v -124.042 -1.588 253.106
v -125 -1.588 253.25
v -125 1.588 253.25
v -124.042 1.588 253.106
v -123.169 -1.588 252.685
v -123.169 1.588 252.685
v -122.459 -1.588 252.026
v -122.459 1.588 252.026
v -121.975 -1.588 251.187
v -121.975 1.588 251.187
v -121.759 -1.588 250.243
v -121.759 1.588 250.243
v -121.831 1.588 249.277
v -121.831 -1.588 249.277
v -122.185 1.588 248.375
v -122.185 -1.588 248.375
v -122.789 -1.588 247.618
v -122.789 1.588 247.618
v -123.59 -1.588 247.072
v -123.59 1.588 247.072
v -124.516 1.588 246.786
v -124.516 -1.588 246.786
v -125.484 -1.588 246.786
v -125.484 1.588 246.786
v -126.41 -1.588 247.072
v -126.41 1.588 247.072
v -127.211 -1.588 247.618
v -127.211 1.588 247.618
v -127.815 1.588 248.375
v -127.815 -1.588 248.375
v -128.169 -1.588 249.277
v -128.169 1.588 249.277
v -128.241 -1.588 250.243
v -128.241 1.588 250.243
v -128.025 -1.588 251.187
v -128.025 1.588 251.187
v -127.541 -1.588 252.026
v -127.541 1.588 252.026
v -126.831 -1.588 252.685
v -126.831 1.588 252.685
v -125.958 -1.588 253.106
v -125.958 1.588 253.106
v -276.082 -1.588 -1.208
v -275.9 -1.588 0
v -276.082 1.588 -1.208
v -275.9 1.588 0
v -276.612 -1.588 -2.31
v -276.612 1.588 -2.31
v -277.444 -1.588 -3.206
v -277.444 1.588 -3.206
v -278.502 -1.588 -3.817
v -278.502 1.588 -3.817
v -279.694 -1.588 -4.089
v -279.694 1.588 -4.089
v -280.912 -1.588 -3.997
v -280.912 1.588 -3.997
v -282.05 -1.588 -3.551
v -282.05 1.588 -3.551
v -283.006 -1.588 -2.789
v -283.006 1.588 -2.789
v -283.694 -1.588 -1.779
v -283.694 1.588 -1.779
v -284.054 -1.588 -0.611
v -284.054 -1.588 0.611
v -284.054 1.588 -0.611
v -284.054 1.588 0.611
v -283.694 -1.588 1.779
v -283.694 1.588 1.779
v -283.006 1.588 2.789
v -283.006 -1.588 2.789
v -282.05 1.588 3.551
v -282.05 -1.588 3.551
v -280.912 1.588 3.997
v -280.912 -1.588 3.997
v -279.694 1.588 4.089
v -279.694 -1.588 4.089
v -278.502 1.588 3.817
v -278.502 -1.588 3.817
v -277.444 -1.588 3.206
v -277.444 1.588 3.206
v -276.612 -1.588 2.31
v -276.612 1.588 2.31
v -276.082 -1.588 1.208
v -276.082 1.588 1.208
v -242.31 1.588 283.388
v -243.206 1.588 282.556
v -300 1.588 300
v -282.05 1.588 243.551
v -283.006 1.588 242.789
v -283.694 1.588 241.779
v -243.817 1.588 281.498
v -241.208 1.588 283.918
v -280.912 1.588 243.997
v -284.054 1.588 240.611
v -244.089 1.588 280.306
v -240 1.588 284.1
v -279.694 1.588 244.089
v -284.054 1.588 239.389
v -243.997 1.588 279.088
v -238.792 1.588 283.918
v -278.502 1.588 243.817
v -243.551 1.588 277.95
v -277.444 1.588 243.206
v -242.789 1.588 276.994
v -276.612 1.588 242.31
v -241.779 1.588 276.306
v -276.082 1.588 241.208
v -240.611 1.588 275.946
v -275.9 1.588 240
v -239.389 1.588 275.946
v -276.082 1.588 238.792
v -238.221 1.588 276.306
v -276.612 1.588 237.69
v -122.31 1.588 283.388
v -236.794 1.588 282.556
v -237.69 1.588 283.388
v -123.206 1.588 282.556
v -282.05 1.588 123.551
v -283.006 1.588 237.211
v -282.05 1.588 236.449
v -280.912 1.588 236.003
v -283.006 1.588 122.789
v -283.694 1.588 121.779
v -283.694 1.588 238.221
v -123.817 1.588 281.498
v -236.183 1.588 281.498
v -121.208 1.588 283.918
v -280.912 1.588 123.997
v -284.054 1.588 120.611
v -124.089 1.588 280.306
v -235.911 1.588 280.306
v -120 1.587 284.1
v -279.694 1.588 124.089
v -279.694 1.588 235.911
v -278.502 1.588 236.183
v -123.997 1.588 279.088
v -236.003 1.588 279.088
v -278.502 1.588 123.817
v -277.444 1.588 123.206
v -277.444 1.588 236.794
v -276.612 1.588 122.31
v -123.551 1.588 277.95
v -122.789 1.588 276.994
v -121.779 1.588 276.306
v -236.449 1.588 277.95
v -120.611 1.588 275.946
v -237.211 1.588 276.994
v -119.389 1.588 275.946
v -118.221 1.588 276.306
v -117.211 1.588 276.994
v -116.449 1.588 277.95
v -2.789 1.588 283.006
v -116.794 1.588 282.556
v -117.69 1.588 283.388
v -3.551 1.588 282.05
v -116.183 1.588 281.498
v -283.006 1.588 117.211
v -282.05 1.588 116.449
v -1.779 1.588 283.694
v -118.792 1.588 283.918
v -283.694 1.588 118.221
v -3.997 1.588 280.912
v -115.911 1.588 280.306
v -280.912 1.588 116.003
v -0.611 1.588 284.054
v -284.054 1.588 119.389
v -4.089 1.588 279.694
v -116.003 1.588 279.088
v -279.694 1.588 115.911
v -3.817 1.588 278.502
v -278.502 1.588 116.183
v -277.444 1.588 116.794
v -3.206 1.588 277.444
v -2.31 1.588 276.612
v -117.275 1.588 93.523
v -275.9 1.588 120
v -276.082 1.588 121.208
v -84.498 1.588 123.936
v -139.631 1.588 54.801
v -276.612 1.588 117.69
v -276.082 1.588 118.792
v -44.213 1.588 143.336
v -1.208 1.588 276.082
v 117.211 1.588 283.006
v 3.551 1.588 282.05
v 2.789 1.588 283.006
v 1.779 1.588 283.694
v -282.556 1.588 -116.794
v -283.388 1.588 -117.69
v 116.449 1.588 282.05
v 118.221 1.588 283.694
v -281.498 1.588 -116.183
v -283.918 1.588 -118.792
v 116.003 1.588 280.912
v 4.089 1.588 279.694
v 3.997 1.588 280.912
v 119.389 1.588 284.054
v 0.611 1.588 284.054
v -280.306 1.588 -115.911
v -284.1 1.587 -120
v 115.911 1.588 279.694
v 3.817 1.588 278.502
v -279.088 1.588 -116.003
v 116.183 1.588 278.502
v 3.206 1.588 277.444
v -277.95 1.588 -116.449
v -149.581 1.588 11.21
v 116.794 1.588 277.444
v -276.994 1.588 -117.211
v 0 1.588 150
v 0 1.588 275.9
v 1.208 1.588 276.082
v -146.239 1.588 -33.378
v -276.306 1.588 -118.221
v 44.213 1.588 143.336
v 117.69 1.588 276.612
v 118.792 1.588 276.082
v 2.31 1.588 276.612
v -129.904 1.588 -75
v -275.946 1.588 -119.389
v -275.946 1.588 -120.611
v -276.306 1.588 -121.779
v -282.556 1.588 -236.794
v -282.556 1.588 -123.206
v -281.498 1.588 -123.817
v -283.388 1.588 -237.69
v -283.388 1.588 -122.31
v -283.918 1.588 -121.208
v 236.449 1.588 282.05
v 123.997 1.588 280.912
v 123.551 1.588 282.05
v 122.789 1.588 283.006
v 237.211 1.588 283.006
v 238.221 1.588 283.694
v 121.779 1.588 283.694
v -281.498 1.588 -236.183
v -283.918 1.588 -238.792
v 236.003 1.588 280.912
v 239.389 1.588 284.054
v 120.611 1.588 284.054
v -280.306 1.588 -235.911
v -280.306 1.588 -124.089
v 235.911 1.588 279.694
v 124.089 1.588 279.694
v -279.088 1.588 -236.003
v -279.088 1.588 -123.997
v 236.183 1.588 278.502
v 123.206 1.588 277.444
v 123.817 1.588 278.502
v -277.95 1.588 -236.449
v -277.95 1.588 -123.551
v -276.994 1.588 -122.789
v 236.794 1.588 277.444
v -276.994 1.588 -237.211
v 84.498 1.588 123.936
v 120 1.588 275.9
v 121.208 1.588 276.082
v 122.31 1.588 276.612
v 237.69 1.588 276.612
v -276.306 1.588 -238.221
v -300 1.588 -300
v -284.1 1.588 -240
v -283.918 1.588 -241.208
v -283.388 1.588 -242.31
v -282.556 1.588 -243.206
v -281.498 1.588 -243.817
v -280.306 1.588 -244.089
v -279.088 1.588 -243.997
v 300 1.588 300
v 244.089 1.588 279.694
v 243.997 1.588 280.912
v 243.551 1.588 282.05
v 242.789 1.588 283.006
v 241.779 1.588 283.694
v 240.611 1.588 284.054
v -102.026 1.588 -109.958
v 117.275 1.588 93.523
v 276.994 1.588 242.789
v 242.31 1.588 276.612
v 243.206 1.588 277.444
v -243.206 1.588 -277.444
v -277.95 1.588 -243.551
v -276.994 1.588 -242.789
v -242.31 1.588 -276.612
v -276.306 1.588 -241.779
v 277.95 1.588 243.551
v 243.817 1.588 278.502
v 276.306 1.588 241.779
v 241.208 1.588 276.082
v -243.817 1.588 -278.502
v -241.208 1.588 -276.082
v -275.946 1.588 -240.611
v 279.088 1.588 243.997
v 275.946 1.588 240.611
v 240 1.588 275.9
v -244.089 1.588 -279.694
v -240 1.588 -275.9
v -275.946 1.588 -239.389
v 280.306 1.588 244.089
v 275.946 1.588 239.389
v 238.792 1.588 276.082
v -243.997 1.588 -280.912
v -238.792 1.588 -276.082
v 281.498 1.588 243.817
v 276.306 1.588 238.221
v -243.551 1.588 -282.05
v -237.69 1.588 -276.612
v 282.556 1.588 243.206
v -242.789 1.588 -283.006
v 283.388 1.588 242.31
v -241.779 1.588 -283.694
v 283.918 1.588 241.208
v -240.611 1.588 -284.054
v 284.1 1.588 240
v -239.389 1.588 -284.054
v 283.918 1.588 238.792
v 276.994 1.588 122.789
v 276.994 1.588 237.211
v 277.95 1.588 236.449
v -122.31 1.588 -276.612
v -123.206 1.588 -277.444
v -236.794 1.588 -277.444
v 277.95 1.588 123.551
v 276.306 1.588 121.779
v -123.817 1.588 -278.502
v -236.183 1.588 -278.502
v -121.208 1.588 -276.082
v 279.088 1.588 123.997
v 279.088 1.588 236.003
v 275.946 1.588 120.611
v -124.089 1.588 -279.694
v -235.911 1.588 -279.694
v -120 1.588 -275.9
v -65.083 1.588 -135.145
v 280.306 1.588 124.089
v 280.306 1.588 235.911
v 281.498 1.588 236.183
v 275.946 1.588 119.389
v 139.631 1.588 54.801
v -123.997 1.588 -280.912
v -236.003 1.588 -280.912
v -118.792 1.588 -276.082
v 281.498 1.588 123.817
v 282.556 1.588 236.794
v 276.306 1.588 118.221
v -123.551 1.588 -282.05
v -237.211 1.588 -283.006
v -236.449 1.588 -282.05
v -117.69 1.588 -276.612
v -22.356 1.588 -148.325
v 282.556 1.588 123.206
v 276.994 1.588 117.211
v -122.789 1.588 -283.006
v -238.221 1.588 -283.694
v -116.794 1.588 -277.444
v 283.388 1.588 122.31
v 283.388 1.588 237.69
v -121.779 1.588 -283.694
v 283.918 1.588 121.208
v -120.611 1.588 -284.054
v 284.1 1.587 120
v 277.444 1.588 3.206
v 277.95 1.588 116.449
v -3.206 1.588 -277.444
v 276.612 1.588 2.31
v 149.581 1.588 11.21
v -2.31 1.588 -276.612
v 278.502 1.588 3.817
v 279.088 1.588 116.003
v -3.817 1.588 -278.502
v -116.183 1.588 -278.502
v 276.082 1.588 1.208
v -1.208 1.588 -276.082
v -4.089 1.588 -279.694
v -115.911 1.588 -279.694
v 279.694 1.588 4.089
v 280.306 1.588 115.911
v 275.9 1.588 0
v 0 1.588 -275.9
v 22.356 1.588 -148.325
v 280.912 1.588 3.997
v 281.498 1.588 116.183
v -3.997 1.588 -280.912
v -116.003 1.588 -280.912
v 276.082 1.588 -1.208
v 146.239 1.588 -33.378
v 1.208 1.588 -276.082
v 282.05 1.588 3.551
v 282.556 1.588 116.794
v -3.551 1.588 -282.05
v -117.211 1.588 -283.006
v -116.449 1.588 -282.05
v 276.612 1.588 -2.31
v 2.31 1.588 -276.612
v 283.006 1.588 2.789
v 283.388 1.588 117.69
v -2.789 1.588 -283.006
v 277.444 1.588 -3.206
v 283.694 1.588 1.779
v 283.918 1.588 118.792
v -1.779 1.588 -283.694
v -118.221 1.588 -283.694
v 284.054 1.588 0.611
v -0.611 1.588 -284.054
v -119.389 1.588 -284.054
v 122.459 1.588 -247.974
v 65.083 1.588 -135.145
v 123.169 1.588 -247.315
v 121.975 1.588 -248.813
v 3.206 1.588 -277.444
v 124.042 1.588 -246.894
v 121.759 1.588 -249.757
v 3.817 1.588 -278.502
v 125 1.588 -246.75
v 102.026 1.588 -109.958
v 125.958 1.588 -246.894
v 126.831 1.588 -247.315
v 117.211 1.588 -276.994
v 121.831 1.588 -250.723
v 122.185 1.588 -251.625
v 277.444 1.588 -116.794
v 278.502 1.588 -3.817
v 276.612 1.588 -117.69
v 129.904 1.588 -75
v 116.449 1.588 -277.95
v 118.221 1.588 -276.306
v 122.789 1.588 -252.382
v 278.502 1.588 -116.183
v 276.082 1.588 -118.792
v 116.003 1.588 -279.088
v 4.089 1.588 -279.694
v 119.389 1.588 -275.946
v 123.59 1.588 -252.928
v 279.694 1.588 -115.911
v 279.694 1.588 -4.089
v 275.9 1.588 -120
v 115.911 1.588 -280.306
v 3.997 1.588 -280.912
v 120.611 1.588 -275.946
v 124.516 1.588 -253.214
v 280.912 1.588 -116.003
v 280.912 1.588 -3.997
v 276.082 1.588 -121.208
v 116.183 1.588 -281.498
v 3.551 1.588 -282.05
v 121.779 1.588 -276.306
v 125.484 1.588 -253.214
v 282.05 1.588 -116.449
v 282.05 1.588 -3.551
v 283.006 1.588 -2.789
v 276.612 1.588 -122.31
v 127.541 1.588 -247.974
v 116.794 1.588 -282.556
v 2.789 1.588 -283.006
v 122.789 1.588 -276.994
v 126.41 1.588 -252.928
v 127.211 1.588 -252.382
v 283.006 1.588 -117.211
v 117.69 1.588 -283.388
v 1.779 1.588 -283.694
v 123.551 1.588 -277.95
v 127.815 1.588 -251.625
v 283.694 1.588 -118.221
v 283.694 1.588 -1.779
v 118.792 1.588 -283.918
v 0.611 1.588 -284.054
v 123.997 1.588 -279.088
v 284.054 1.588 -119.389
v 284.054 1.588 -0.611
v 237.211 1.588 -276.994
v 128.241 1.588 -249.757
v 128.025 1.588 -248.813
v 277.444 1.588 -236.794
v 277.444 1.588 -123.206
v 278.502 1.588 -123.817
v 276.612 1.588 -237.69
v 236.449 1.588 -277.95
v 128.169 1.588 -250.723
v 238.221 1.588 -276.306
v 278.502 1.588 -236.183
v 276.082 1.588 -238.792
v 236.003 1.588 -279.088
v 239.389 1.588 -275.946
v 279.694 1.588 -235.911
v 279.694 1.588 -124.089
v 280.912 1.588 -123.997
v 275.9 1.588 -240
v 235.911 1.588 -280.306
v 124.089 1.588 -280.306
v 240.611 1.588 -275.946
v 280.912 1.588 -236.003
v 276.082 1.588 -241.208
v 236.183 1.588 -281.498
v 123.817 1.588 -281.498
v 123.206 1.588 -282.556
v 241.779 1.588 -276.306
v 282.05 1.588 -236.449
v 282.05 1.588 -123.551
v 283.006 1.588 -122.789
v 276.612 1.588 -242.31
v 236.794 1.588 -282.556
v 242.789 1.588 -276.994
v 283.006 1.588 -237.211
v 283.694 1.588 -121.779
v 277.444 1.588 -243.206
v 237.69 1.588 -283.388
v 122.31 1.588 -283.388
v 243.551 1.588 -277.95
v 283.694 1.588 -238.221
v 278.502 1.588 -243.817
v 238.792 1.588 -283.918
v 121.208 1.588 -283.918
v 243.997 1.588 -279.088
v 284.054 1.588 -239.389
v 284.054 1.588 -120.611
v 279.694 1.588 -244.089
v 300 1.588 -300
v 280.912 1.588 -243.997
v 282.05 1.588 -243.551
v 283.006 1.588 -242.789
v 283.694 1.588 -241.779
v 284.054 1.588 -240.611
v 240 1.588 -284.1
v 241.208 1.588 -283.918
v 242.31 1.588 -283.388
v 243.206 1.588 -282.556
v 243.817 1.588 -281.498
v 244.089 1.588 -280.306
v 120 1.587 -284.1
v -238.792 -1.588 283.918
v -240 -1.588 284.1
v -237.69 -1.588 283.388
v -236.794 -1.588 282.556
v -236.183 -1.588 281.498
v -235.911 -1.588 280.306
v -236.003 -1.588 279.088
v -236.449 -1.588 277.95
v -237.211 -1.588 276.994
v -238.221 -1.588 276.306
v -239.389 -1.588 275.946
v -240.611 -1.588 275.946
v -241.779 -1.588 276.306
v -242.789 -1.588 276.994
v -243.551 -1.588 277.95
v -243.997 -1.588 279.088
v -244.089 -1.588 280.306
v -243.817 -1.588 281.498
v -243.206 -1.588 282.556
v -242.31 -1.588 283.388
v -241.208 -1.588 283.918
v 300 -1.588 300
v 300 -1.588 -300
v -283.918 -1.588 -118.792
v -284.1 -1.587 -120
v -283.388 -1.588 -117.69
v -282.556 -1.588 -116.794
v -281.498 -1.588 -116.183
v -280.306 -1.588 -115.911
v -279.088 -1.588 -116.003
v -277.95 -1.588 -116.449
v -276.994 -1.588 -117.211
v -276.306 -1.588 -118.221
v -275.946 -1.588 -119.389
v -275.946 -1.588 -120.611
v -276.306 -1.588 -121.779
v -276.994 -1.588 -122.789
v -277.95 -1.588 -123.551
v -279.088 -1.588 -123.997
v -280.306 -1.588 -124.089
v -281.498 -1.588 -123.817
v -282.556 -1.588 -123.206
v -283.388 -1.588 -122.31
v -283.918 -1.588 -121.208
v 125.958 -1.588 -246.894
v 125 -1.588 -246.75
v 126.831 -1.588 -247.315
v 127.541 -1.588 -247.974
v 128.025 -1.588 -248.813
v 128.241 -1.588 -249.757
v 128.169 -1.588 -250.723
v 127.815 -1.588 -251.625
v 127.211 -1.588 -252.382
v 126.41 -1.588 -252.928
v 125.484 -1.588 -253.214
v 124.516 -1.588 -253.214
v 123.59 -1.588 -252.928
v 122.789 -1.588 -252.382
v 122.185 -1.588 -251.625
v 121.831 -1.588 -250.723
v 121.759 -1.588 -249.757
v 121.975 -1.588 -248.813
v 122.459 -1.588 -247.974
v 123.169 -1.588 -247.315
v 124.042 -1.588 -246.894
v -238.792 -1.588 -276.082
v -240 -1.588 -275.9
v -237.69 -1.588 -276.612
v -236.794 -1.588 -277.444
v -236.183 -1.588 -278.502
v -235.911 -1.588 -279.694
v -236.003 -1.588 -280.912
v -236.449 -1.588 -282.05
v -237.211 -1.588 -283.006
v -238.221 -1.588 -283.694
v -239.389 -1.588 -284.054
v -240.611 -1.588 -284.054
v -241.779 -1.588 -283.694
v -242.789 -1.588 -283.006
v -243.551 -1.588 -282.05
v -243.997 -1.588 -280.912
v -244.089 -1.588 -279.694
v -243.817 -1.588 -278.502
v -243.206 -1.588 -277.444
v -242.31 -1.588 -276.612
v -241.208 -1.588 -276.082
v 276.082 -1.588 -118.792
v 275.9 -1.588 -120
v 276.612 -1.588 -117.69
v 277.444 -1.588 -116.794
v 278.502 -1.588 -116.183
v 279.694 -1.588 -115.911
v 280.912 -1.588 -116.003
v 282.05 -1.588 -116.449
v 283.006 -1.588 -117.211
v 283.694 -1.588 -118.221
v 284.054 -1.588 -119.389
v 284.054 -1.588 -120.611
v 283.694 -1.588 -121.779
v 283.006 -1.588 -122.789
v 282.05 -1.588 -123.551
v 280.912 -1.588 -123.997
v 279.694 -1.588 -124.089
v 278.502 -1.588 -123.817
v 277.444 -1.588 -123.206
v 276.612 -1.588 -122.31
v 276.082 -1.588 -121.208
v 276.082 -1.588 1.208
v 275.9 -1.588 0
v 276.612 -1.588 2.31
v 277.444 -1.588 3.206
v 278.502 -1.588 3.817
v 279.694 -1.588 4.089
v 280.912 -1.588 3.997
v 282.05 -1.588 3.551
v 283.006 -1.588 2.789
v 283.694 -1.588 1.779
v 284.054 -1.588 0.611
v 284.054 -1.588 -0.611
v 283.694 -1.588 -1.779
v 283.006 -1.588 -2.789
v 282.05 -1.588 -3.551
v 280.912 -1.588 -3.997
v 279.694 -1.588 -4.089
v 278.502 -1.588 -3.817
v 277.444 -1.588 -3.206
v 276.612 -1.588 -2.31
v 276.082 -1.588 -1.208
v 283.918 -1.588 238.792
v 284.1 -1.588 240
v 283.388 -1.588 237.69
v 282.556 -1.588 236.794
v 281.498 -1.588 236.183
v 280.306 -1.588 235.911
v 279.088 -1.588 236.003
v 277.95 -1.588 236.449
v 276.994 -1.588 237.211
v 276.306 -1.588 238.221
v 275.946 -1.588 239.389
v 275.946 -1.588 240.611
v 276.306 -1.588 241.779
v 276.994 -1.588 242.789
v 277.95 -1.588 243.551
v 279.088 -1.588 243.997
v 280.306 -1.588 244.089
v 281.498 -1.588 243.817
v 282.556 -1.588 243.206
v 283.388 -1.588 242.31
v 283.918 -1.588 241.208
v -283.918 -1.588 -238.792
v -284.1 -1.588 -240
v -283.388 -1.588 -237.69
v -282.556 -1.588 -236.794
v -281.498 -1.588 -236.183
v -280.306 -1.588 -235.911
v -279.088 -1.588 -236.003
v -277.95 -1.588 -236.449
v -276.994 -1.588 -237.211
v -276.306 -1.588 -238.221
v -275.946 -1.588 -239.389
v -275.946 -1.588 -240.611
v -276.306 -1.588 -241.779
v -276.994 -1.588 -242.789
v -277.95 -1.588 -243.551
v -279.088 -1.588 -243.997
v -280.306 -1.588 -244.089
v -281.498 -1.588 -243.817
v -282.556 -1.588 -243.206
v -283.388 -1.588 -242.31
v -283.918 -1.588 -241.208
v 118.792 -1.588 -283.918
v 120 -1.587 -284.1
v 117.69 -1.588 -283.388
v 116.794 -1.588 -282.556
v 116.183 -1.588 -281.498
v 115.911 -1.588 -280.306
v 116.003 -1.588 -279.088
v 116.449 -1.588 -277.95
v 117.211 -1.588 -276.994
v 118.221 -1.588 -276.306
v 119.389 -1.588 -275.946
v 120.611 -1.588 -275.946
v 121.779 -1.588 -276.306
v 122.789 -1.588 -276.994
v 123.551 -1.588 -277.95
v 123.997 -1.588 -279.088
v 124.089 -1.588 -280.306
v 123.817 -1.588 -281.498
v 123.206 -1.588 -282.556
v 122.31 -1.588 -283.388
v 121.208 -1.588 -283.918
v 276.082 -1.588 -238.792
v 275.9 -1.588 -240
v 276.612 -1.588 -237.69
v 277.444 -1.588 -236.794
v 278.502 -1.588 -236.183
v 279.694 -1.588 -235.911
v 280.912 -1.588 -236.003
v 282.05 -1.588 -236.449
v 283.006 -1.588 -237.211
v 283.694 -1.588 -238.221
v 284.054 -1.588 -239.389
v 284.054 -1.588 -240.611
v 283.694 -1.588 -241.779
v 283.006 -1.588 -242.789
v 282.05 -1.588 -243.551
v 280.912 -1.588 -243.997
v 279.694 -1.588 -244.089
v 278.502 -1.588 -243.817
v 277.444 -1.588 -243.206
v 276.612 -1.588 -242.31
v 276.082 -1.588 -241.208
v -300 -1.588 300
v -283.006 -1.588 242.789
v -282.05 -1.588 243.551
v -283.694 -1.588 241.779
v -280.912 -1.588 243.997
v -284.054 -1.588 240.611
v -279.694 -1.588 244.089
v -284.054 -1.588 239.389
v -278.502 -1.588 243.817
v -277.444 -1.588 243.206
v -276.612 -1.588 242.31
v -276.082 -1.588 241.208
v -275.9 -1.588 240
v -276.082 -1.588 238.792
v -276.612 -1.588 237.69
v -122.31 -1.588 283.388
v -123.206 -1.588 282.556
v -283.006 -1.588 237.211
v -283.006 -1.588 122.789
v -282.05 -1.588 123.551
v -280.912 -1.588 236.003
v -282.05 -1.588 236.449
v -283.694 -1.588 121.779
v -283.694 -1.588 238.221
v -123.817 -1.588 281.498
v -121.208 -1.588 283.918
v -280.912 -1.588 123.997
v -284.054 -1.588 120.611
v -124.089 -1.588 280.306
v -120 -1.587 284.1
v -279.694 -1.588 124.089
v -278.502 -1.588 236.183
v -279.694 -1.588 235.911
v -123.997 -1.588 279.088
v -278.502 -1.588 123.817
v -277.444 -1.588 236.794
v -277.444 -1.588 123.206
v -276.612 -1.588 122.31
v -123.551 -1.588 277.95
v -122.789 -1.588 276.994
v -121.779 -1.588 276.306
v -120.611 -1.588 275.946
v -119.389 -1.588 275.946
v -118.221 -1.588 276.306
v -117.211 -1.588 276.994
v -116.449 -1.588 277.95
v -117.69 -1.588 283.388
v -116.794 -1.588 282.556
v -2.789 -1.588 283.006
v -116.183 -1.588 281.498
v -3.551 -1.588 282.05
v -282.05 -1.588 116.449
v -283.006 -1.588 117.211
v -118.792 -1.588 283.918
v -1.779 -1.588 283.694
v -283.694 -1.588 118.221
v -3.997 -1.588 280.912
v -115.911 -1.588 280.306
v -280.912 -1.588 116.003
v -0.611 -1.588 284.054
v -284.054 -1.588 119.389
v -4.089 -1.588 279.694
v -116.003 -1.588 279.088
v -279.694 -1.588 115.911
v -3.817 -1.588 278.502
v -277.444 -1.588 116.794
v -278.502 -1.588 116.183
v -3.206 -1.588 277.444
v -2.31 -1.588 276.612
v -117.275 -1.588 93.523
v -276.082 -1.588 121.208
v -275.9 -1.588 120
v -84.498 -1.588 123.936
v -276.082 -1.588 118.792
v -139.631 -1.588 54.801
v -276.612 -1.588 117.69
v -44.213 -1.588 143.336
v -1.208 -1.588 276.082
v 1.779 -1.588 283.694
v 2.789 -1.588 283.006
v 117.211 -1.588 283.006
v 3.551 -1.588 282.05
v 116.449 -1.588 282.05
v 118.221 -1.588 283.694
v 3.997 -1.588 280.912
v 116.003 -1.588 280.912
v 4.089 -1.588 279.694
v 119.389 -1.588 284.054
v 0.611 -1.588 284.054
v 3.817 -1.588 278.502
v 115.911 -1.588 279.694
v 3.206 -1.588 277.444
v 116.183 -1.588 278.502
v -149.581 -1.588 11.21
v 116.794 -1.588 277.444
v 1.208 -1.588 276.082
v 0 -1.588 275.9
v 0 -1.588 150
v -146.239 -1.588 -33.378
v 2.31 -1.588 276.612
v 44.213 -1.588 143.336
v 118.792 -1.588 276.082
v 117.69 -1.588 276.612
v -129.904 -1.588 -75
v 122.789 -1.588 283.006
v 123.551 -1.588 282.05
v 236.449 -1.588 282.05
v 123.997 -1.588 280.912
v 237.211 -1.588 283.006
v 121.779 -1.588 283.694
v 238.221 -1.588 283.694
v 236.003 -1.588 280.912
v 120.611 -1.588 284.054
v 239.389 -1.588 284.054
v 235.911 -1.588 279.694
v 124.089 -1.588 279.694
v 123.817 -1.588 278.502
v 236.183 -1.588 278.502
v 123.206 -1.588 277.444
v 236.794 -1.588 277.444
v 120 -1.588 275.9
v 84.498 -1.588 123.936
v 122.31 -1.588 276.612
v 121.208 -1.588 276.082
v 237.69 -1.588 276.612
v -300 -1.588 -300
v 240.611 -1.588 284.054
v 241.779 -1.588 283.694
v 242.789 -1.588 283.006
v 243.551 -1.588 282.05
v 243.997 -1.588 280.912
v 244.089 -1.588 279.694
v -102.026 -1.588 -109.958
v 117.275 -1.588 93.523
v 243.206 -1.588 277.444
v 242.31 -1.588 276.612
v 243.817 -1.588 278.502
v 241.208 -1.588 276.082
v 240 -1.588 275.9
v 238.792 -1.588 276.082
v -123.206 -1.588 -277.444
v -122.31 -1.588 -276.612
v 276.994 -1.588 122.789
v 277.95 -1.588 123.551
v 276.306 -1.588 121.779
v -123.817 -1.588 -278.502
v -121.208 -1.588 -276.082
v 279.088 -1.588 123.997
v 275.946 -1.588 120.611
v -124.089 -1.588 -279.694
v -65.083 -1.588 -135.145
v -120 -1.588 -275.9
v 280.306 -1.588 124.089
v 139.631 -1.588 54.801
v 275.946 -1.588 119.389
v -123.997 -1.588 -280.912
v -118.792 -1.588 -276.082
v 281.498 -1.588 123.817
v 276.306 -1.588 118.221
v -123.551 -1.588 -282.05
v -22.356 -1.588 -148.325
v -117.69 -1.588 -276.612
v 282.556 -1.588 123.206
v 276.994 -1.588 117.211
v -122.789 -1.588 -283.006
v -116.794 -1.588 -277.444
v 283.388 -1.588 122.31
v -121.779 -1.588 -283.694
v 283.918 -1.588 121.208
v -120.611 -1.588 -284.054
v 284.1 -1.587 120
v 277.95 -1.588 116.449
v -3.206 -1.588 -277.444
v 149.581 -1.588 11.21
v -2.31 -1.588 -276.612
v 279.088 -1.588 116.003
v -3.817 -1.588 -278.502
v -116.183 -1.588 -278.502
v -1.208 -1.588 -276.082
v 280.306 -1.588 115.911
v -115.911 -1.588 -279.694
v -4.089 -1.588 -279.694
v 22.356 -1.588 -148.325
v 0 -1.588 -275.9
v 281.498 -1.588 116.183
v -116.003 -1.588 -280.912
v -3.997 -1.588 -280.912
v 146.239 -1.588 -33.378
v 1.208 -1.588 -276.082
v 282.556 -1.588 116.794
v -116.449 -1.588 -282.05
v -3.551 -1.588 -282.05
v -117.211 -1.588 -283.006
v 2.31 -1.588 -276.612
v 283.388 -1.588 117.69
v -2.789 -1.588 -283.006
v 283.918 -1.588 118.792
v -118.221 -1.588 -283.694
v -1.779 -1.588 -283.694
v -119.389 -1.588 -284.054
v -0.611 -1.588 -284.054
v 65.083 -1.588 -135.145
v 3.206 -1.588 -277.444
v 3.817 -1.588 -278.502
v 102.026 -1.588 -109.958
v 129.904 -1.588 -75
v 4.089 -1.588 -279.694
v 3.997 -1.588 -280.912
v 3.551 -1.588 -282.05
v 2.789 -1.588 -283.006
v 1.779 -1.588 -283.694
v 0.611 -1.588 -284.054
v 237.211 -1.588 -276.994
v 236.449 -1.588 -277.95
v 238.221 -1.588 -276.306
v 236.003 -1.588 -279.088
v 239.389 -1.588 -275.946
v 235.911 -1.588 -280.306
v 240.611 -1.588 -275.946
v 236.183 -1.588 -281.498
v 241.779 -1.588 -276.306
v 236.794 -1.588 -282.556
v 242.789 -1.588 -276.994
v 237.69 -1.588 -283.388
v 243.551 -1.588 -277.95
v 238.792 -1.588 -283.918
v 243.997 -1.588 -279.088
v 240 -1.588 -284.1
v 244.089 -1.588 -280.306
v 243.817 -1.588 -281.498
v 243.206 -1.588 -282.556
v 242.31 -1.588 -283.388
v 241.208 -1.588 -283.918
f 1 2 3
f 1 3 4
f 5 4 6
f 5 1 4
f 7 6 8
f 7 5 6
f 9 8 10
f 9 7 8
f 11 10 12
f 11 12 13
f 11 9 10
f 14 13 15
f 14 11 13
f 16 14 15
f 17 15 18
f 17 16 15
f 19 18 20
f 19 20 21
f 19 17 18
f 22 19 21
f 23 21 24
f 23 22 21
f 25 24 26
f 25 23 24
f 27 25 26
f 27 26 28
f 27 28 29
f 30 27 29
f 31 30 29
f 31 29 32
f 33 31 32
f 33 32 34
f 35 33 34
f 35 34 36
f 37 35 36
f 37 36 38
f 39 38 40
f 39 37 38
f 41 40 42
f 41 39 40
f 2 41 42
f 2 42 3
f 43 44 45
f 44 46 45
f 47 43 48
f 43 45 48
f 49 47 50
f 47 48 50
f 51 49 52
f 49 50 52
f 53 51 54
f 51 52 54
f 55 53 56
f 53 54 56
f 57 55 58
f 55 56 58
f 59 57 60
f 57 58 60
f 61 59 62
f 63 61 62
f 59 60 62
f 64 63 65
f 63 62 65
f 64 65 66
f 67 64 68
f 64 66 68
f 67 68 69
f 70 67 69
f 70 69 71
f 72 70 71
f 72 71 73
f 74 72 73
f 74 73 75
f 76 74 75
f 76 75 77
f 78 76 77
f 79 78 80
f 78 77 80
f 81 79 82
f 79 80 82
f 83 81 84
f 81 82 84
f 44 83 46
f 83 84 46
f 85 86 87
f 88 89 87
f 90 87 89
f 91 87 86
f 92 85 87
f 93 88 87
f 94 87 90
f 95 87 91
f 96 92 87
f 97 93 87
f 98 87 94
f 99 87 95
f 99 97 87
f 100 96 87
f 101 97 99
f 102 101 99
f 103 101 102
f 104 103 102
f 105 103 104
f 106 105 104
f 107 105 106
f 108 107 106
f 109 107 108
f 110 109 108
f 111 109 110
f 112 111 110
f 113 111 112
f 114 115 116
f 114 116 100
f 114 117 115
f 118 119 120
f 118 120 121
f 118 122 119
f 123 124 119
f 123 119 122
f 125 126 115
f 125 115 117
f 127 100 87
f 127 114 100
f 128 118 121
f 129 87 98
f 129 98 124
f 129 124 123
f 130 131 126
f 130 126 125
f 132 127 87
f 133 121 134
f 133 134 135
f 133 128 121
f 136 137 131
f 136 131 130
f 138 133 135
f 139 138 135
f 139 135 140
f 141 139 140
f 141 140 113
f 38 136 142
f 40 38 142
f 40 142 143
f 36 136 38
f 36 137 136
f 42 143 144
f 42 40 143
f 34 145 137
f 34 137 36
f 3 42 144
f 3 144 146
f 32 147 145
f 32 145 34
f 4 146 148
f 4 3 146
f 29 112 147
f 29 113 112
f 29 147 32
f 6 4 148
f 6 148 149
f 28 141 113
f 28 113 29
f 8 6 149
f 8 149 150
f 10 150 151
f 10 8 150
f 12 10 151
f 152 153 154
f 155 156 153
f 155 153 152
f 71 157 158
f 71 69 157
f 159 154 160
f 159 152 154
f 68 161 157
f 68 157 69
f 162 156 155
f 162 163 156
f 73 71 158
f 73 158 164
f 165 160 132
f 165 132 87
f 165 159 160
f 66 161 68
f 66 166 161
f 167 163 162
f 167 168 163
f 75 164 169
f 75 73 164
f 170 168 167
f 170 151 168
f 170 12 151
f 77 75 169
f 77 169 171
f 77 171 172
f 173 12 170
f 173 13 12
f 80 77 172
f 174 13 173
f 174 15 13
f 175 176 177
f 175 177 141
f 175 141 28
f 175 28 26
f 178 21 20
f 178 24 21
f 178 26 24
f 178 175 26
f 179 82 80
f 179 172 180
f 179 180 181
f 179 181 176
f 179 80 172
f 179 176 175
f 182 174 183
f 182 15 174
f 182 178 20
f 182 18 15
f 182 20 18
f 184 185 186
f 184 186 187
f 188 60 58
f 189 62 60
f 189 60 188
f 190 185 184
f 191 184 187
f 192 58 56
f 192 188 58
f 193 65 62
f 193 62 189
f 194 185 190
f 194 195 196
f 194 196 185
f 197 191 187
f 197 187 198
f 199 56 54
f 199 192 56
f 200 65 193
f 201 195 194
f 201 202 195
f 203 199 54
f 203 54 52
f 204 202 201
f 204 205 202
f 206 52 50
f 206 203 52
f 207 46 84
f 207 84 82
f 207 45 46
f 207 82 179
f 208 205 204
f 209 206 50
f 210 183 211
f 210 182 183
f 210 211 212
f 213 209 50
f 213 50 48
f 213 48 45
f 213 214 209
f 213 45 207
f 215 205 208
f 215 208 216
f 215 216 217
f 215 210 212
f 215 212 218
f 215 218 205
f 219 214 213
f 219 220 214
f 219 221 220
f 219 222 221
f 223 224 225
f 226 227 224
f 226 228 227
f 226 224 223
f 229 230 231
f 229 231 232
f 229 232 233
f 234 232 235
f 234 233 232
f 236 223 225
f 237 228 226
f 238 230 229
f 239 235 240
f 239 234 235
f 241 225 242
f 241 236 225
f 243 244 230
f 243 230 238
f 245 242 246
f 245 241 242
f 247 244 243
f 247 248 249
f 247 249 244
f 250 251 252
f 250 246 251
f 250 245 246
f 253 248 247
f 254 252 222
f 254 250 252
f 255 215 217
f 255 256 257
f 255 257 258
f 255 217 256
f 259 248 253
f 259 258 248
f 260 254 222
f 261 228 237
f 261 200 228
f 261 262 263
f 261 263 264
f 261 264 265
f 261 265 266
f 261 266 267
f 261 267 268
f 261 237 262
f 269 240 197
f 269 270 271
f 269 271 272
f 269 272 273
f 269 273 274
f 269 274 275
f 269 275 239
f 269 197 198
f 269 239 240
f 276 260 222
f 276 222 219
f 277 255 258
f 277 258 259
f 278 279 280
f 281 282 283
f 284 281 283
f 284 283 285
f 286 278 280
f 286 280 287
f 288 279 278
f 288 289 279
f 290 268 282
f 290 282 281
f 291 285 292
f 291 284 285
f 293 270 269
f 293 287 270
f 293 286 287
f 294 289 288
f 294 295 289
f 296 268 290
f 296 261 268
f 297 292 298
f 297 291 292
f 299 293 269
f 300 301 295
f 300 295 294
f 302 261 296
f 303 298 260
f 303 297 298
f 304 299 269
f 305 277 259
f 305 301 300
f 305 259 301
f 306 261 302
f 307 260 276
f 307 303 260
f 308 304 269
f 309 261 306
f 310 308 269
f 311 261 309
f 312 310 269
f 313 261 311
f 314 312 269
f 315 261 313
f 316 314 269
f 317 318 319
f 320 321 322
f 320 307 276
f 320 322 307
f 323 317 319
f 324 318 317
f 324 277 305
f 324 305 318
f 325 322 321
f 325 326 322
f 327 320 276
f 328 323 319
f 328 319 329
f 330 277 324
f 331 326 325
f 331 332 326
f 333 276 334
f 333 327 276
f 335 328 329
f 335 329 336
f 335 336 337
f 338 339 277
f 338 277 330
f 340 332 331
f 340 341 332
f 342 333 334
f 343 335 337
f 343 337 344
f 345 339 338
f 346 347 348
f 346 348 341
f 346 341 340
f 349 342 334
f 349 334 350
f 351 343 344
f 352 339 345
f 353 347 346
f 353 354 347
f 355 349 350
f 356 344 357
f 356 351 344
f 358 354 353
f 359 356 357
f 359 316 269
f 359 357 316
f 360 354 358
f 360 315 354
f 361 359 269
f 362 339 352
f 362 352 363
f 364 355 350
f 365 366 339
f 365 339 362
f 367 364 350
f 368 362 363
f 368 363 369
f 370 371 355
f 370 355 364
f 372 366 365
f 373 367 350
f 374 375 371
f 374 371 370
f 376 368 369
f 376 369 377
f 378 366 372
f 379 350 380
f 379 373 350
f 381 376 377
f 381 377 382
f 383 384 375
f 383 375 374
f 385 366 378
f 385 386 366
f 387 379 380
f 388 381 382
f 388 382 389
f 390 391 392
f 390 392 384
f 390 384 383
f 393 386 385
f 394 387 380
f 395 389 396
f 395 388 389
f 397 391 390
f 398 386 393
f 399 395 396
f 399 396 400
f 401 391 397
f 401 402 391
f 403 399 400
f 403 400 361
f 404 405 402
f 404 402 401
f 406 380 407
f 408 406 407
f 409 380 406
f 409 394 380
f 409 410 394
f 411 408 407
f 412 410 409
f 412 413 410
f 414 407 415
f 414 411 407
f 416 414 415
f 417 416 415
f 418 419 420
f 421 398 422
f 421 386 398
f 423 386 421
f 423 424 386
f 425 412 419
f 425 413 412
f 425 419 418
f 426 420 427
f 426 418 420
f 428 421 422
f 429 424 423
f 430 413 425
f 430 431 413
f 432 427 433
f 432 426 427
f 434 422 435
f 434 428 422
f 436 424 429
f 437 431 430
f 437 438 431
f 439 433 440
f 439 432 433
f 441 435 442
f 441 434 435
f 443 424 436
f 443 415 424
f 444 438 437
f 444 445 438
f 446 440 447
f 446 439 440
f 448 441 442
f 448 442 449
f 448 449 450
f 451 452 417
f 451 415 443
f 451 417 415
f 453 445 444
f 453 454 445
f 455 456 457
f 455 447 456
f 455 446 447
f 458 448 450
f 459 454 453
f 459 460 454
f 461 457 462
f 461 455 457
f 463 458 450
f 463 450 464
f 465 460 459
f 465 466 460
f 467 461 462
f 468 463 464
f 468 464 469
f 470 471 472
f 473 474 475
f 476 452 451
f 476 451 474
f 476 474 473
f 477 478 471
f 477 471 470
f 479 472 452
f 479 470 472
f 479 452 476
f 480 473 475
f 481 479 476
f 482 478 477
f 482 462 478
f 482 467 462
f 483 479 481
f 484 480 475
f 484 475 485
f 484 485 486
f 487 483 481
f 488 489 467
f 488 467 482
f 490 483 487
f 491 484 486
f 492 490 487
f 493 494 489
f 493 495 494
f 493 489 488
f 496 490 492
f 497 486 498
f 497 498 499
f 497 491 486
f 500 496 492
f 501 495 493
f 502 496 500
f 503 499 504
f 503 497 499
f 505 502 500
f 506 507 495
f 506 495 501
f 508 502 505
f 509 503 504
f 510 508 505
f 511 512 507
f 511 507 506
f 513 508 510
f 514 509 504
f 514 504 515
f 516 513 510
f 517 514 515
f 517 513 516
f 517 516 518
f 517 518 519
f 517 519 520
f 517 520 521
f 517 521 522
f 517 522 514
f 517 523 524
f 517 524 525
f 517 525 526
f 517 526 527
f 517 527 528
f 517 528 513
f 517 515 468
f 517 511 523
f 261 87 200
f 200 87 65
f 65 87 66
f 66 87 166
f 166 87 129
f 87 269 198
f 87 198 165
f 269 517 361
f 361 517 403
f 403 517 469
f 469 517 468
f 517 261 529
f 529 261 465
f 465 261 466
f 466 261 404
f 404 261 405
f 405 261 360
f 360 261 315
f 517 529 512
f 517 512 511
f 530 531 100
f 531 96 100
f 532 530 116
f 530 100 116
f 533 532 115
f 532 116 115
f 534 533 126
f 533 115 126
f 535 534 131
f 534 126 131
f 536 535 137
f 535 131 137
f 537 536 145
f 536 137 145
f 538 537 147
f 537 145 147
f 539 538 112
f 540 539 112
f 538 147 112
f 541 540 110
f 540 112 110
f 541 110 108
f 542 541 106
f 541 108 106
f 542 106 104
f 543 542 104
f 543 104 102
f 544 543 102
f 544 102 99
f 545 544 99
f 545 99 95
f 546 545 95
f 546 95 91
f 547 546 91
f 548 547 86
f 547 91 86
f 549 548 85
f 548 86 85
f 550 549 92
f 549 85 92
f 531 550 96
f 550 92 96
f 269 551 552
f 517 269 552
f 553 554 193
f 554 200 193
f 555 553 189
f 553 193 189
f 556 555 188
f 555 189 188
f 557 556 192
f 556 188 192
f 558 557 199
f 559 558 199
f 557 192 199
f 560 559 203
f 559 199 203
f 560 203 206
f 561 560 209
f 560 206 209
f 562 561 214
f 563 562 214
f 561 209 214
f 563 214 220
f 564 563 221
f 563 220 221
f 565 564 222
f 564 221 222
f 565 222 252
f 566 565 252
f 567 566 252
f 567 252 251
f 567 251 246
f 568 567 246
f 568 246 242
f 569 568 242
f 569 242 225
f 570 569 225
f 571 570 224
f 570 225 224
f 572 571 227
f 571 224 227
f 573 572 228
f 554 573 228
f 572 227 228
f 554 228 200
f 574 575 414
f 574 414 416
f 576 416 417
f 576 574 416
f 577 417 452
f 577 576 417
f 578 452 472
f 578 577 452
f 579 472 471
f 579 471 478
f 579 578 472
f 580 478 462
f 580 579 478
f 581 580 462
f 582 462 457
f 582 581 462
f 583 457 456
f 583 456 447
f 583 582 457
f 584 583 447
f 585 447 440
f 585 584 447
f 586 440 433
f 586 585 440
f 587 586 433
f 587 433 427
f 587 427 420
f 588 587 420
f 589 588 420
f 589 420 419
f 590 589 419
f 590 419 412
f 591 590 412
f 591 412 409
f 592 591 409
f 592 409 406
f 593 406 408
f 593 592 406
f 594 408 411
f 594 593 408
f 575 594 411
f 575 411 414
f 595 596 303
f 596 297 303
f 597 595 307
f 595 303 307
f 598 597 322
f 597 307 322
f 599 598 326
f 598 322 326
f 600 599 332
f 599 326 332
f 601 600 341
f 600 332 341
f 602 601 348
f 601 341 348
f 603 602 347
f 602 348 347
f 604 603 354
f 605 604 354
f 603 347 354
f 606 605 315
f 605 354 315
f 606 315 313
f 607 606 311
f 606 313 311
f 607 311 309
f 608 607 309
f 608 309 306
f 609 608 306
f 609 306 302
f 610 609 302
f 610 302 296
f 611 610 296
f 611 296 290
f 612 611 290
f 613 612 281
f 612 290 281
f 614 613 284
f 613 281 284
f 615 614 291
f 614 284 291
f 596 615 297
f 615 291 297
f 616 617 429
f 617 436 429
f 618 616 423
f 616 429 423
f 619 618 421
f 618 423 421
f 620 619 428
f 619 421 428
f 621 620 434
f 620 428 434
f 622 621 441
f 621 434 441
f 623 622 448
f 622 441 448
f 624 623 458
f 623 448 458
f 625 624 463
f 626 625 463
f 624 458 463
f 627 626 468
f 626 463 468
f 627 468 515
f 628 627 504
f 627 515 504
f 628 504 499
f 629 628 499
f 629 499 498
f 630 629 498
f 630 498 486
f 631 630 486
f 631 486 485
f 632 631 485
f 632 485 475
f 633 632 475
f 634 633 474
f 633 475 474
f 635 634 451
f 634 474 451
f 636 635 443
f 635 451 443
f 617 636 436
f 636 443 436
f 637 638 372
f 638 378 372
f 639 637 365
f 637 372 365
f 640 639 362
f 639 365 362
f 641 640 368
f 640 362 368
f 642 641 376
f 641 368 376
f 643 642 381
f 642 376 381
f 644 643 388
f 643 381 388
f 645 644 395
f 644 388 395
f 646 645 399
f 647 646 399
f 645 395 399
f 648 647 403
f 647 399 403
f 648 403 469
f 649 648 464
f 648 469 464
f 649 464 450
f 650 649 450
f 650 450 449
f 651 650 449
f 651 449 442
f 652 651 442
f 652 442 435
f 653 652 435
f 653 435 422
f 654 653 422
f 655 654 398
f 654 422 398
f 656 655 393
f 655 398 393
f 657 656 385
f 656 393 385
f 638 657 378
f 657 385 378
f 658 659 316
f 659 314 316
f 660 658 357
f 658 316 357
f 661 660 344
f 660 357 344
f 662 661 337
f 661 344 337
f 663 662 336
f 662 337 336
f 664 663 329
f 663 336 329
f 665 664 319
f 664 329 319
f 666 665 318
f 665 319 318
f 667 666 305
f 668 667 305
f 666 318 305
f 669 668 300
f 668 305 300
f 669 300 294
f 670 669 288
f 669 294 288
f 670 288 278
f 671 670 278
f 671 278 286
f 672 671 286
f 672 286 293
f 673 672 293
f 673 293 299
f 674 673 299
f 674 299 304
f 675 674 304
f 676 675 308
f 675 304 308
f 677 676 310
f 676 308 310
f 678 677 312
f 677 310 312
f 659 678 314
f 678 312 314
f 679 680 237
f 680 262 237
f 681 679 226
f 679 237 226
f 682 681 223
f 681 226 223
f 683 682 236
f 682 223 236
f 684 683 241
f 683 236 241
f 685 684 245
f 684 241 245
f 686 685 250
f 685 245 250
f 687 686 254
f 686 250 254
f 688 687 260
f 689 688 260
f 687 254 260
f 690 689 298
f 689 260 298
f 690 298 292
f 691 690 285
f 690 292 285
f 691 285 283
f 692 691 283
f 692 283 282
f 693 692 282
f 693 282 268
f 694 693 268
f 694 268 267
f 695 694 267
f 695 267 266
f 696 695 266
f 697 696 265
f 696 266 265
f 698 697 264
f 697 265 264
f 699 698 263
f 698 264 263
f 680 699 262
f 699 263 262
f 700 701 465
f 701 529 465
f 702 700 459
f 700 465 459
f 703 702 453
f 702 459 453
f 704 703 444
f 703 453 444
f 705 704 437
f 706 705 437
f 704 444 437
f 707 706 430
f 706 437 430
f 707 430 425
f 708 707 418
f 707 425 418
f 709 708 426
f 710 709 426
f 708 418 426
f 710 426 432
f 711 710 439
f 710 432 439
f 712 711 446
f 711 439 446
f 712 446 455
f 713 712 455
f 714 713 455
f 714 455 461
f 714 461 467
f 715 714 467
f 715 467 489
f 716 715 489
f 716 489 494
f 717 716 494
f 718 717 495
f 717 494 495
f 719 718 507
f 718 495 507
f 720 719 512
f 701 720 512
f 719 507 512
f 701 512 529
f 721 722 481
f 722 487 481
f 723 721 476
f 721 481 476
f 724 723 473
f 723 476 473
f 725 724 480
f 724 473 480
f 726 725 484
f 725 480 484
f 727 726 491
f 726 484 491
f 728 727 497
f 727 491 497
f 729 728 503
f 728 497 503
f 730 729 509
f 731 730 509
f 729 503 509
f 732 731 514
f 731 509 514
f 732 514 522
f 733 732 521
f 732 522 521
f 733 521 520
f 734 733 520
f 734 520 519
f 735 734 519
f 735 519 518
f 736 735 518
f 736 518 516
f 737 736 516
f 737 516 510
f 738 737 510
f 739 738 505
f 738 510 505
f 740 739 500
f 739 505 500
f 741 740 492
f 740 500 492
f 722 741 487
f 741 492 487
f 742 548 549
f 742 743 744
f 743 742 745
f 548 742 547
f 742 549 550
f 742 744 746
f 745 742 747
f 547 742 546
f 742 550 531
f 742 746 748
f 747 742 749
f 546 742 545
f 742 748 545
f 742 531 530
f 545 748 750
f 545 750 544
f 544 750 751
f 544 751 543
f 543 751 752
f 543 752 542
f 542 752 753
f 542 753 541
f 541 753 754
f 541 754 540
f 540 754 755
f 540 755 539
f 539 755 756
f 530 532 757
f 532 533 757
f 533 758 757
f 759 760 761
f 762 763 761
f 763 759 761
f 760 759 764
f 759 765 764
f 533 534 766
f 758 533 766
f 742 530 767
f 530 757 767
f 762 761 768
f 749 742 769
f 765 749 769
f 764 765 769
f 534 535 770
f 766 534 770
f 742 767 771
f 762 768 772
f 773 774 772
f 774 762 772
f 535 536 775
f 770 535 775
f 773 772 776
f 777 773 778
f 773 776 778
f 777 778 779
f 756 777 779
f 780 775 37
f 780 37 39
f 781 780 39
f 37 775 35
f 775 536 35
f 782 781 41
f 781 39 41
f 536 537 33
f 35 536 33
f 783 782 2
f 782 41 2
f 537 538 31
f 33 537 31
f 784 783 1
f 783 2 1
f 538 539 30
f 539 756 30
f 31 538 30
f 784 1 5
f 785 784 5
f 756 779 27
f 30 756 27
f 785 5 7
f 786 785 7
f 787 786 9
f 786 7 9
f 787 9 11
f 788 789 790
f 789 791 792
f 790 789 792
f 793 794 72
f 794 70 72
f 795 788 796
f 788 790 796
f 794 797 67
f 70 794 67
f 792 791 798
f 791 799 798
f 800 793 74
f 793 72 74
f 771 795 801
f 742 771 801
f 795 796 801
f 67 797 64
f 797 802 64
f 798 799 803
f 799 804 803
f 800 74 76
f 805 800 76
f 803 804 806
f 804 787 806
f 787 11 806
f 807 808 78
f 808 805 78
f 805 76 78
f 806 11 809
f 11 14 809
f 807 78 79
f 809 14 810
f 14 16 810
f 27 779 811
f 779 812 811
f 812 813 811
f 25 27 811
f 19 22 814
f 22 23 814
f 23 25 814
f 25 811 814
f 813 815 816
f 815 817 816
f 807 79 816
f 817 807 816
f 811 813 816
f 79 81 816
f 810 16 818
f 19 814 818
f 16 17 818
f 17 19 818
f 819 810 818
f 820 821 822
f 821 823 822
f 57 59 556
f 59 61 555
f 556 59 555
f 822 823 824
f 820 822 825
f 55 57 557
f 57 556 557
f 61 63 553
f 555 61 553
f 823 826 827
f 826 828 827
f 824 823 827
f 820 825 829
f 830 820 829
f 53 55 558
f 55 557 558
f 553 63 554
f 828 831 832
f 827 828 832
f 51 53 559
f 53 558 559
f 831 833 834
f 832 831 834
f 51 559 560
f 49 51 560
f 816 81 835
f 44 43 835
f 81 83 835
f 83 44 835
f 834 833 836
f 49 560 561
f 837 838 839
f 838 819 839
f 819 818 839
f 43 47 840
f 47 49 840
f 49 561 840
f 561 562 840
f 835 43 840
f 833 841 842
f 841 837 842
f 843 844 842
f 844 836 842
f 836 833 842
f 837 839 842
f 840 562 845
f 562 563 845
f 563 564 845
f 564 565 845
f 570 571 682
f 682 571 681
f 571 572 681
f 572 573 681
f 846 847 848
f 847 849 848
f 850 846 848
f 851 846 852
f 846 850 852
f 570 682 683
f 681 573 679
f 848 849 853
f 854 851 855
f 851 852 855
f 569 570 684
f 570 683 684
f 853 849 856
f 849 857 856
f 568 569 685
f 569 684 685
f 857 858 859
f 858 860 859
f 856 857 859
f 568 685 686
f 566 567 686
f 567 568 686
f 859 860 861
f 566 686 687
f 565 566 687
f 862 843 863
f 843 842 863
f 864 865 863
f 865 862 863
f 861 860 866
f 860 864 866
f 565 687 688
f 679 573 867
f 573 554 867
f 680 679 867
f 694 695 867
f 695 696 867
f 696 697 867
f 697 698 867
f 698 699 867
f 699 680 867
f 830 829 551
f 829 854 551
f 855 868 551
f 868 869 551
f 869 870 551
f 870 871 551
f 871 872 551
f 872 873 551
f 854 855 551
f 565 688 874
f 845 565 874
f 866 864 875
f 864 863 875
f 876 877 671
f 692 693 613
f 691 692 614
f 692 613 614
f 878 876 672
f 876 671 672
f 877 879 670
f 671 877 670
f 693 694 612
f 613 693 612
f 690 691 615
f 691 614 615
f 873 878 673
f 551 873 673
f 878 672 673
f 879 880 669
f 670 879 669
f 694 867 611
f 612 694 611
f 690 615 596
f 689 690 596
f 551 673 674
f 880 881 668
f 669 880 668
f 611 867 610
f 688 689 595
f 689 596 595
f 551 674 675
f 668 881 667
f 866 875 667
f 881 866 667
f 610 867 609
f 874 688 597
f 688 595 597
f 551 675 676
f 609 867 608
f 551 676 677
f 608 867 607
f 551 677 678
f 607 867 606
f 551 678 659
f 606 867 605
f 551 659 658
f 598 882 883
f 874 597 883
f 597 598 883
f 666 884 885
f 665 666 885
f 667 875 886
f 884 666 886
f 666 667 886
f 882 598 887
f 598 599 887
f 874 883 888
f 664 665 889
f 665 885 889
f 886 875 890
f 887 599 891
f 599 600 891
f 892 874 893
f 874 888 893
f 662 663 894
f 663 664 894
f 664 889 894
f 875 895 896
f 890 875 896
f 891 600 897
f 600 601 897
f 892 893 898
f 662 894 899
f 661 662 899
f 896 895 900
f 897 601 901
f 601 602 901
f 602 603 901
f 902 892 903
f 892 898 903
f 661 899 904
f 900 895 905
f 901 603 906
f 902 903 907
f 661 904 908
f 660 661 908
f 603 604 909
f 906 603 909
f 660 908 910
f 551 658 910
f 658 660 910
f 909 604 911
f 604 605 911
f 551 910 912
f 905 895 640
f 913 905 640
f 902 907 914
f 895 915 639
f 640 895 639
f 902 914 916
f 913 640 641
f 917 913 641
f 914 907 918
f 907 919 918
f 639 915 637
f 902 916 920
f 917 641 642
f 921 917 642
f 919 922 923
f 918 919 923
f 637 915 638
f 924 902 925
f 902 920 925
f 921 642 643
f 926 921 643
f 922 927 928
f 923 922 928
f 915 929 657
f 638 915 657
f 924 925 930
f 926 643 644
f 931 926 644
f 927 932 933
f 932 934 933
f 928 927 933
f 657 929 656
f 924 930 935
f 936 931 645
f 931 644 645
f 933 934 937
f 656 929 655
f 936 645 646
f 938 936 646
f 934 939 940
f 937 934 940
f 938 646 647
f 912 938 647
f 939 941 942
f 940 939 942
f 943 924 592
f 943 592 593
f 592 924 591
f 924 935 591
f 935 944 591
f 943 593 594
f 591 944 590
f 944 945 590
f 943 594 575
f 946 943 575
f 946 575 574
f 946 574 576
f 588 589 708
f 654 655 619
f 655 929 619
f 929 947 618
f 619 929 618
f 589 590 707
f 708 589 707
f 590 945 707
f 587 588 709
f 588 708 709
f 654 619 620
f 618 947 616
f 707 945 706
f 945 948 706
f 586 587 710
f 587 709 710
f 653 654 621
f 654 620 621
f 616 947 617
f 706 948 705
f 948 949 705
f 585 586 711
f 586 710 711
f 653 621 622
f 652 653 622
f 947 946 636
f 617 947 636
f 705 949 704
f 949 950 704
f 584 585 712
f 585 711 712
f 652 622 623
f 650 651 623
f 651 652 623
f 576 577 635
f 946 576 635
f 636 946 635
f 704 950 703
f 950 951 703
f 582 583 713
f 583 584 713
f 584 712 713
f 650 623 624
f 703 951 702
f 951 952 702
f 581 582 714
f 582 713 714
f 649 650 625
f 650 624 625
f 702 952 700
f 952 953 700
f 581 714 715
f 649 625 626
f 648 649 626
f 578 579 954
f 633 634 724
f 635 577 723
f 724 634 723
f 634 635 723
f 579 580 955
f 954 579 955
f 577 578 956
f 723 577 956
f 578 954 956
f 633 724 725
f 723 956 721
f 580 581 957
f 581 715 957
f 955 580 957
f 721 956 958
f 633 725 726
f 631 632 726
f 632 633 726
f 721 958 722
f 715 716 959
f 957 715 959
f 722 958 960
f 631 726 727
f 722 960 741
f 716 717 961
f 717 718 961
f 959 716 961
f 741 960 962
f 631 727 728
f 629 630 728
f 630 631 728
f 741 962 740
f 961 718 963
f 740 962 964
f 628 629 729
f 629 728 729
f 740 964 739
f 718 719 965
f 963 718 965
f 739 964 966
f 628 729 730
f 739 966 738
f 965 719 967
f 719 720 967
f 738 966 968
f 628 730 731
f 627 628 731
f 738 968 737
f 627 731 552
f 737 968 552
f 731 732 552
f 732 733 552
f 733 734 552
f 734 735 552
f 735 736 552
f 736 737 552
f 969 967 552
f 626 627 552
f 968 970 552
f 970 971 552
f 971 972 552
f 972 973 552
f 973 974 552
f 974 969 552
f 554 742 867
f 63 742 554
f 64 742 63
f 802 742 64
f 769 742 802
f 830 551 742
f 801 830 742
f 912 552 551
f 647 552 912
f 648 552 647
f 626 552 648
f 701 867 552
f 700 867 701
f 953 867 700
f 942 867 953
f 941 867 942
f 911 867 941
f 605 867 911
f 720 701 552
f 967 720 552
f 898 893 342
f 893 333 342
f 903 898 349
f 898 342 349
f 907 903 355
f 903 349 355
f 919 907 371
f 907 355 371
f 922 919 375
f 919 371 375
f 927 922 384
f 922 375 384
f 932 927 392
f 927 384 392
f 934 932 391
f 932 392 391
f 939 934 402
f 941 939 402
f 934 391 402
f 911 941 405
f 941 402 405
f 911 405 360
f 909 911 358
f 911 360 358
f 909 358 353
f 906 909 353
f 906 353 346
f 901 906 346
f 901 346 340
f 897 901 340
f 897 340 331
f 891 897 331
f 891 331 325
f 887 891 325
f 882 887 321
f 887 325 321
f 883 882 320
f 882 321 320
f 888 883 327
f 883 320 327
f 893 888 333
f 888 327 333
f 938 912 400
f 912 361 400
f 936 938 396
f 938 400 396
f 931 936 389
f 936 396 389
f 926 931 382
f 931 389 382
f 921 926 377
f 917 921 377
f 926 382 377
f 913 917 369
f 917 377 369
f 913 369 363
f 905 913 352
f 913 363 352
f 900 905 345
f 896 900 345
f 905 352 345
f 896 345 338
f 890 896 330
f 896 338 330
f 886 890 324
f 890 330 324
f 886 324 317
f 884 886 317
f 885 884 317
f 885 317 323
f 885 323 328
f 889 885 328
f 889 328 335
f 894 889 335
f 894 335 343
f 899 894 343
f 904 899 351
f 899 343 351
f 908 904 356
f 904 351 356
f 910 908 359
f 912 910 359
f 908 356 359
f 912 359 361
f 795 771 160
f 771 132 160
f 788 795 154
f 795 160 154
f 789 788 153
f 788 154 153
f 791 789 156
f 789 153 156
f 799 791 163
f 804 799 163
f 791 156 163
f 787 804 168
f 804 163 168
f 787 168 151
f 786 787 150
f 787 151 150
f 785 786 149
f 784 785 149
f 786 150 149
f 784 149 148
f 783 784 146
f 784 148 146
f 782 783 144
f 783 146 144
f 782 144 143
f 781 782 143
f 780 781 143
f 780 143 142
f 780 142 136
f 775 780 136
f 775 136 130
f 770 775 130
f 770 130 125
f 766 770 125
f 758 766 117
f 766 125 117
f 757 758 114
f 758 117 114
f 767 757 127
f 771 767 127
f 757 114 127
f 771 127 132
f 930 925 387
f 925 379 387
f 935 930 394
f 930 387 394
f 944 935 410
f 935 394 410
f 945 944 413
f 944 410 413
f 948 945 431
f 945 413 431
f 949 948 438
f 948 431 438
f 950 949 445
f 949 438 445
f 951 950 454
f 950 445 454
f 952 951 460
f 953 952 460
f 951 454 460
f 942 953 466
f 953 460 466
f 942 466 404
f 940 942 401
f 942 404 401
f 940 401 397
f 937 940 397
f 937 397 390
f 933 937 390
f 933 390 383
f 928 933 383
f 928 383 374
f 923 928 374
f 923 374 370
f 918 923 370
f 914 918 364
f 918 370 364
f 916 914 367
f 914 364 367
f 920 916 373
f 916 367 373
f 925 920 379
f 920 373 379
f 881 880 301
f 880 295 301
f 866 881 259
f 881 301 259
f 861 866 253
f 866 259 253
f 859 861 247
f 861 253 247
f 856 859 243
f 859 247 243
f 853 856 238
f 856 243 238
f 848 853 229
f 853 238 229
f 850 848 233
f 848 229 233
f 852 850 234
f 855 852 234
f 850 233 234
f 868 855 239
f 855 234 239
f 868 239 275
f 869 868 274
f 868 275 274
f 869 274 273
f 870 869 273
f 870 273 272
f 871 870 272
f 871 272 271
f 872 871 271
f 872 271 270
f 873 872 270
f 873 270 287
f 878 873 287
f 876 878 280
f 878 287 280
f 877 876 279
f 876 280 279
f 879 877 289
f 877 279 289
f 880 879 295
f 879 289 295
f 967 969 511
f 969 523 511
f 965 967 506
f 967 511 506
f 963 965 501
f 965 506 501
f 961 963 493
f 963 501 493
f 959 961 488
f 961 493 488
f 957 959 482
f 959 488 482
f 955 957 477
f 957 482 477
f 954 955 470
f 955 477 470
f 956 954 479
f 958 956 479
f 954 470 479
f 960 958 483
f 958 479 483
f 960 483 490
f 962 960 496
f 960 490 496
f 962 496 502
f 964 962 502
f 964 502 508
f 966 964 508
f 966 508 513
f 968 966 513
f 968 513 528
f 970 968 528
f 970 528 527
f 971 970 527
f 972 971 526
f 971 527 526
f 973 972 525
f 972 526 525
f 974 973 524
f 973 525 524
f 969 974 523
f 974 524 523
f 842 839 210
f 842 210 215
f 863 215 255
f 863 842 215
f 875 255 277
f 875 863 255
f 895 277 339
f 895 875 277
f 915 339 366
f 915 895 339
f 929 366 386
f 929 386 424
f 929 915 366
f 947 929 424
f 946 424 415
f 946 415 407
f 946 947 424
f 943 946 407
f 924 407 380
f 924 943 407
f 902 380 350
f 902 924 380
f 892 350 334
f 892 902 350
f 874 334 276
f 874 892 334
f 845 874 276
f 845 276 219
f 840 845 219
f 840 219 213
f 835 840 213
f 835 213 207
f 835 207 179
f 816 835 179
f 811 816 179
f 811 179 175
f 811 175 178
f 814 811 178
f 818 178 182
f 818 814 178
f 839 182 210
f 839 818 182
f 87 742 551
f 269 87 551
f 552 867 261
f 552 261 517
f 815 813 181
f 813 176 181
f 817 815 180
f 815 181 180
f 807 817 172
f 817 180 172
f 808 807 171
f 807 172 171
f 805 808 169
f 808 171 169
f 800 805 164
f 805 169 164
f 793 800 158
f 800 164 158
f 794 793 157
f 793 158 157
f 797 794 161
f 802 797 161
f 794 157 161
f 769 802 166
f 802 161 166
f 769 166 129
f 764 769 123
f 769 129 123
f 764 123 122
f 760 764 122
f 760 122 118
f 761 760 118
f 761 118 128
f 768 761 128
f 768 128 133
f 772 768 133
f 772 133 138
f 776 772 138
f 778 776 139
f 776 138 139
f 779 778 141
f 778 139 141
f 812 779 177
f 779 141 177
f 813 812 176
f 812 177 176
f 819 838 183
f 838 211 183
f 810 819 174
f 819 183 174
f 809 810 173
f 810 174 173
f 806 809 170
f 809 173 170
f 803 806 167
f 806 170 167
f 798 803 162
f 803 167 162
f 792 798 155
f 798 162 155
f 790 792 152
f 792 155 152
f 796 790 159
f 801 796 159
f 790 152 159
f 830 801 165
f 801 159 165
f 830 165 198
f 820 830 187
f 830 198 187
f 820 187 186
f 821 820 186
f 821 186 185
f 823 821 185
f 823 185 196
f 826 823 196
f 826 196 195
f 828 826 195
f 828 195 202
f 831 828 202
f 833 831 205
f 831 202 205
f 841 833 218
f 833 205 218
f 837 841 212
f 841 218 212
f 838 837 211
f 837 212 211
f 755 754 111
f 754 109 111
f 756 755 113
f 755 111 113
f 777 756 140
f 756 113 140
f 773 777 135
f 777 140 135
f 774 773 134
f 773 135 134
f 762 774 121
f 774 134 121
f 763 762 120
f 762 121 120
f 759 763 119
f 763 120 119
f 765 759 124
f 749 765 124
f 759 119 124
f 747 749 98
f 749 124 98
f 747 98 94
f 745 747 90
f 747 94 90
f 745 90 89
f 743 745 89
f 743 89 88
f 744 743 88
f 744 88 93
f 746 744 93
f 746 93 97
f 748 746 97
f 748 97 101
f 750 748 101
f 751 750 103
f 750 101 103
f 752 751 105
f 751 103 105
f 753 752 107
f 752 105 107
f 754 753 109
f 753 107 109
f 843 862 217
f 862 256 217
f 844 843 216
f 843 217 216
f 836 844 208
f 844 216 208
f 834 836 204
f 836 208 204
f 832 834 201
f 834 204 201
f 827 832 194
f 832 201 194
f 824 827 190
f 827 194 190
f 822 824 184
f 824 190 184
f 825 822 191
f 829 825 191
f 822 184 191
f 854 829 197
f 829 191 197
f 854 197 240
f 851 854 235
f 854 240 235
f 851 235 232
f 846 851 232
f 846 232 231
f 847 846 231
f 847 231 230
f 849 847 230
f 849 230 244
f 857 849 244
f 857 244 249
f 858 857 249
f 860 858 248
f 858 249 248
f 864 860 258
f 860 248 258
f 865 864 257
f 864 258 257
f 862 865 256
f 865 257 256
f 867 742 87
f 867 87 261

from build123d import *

# Parameters (mm, degrees)
BOSS_EXTRUDE1_DEPTH      = 1.5875
BOSS_EXTRUDE1_DEPTH_BACK = 1.5875
SKETCH1_W                = 600
SKETCH1_H                = 600
SKETCH1_R                = 3.25
SKETCH1_R_2              = 150
SKETCH3_R                = 4.1
CUT_EXTRUDE2_DEPTH       = 425.267038734
CIRPATTERN1_COUNT        = 4


with BuildPart() as part:
    # Sketch1 → Boss-Extrude1 (new, two sides: drawn at the far end of the back side and taken through both)
    with BuildSketch(Plane(origin=(0, 0, 0), x_dir=(1, 0, 0), z_dir=(0, 1, 0)).offset(-BOSS_EXTRUDE1_DEPTH_BACK)):
        Rectangle(SKETCH1_W, SKETCH1_H)
        with Locations((125, 250)):
            Circle(SKETCH1_R, mode=Mode.SUBTRACT)
        with Locations((-125, -250)):
            Circle(SKETCH1_R, mode=Mode.SUBTRACT)
        Circle(SKETCH1_R_2, mode=Mode.SUBTRACT)
    extrude(amount=BOSS_EXTRUDE1_DEPTH + BOSS_EXTRUDE1_DEPTH_BACK)

    # Sketch3 → Cut-Extrude2 (cut, symmetric)
    with BuildSketch(Plane(origin=(0, 0, 0), x_dir=(1, 0, 0), z_dir=(0, 1, 0))):
        with Locations((0, 280)):
            Circle(SKETCH3_R)
        with Locations((-120, 280)):
            Circle(SKETCH3_R)
        with Locations((-240, 280)):
            Circle(SKETCH3_R)
        with Locations((240, 280)):
            Circle(SKETCH3_R)
        with Locations((120, 280)):
            Circle(SKETCH3_R)
    cut_extrude2 = extrude(amount=CUT_EXTRUDE2_DEPTH, both=True, mode=Mode.SUBTRACT)

    # CirPattern1: Cut-Extrude2 ×4 about axis
    cirpattern1_axis = Axis((0, 1.74625, 0), (0, -1, 0))
    for i in range(1, CIRPATTERN1_COUNT):
        add(cut_extrude2.rotate(cirpattern1_axis, i * 360 / CIRPATTERN1_COUNT), mode=Mode.SUBTRACT)


solid = part.part
